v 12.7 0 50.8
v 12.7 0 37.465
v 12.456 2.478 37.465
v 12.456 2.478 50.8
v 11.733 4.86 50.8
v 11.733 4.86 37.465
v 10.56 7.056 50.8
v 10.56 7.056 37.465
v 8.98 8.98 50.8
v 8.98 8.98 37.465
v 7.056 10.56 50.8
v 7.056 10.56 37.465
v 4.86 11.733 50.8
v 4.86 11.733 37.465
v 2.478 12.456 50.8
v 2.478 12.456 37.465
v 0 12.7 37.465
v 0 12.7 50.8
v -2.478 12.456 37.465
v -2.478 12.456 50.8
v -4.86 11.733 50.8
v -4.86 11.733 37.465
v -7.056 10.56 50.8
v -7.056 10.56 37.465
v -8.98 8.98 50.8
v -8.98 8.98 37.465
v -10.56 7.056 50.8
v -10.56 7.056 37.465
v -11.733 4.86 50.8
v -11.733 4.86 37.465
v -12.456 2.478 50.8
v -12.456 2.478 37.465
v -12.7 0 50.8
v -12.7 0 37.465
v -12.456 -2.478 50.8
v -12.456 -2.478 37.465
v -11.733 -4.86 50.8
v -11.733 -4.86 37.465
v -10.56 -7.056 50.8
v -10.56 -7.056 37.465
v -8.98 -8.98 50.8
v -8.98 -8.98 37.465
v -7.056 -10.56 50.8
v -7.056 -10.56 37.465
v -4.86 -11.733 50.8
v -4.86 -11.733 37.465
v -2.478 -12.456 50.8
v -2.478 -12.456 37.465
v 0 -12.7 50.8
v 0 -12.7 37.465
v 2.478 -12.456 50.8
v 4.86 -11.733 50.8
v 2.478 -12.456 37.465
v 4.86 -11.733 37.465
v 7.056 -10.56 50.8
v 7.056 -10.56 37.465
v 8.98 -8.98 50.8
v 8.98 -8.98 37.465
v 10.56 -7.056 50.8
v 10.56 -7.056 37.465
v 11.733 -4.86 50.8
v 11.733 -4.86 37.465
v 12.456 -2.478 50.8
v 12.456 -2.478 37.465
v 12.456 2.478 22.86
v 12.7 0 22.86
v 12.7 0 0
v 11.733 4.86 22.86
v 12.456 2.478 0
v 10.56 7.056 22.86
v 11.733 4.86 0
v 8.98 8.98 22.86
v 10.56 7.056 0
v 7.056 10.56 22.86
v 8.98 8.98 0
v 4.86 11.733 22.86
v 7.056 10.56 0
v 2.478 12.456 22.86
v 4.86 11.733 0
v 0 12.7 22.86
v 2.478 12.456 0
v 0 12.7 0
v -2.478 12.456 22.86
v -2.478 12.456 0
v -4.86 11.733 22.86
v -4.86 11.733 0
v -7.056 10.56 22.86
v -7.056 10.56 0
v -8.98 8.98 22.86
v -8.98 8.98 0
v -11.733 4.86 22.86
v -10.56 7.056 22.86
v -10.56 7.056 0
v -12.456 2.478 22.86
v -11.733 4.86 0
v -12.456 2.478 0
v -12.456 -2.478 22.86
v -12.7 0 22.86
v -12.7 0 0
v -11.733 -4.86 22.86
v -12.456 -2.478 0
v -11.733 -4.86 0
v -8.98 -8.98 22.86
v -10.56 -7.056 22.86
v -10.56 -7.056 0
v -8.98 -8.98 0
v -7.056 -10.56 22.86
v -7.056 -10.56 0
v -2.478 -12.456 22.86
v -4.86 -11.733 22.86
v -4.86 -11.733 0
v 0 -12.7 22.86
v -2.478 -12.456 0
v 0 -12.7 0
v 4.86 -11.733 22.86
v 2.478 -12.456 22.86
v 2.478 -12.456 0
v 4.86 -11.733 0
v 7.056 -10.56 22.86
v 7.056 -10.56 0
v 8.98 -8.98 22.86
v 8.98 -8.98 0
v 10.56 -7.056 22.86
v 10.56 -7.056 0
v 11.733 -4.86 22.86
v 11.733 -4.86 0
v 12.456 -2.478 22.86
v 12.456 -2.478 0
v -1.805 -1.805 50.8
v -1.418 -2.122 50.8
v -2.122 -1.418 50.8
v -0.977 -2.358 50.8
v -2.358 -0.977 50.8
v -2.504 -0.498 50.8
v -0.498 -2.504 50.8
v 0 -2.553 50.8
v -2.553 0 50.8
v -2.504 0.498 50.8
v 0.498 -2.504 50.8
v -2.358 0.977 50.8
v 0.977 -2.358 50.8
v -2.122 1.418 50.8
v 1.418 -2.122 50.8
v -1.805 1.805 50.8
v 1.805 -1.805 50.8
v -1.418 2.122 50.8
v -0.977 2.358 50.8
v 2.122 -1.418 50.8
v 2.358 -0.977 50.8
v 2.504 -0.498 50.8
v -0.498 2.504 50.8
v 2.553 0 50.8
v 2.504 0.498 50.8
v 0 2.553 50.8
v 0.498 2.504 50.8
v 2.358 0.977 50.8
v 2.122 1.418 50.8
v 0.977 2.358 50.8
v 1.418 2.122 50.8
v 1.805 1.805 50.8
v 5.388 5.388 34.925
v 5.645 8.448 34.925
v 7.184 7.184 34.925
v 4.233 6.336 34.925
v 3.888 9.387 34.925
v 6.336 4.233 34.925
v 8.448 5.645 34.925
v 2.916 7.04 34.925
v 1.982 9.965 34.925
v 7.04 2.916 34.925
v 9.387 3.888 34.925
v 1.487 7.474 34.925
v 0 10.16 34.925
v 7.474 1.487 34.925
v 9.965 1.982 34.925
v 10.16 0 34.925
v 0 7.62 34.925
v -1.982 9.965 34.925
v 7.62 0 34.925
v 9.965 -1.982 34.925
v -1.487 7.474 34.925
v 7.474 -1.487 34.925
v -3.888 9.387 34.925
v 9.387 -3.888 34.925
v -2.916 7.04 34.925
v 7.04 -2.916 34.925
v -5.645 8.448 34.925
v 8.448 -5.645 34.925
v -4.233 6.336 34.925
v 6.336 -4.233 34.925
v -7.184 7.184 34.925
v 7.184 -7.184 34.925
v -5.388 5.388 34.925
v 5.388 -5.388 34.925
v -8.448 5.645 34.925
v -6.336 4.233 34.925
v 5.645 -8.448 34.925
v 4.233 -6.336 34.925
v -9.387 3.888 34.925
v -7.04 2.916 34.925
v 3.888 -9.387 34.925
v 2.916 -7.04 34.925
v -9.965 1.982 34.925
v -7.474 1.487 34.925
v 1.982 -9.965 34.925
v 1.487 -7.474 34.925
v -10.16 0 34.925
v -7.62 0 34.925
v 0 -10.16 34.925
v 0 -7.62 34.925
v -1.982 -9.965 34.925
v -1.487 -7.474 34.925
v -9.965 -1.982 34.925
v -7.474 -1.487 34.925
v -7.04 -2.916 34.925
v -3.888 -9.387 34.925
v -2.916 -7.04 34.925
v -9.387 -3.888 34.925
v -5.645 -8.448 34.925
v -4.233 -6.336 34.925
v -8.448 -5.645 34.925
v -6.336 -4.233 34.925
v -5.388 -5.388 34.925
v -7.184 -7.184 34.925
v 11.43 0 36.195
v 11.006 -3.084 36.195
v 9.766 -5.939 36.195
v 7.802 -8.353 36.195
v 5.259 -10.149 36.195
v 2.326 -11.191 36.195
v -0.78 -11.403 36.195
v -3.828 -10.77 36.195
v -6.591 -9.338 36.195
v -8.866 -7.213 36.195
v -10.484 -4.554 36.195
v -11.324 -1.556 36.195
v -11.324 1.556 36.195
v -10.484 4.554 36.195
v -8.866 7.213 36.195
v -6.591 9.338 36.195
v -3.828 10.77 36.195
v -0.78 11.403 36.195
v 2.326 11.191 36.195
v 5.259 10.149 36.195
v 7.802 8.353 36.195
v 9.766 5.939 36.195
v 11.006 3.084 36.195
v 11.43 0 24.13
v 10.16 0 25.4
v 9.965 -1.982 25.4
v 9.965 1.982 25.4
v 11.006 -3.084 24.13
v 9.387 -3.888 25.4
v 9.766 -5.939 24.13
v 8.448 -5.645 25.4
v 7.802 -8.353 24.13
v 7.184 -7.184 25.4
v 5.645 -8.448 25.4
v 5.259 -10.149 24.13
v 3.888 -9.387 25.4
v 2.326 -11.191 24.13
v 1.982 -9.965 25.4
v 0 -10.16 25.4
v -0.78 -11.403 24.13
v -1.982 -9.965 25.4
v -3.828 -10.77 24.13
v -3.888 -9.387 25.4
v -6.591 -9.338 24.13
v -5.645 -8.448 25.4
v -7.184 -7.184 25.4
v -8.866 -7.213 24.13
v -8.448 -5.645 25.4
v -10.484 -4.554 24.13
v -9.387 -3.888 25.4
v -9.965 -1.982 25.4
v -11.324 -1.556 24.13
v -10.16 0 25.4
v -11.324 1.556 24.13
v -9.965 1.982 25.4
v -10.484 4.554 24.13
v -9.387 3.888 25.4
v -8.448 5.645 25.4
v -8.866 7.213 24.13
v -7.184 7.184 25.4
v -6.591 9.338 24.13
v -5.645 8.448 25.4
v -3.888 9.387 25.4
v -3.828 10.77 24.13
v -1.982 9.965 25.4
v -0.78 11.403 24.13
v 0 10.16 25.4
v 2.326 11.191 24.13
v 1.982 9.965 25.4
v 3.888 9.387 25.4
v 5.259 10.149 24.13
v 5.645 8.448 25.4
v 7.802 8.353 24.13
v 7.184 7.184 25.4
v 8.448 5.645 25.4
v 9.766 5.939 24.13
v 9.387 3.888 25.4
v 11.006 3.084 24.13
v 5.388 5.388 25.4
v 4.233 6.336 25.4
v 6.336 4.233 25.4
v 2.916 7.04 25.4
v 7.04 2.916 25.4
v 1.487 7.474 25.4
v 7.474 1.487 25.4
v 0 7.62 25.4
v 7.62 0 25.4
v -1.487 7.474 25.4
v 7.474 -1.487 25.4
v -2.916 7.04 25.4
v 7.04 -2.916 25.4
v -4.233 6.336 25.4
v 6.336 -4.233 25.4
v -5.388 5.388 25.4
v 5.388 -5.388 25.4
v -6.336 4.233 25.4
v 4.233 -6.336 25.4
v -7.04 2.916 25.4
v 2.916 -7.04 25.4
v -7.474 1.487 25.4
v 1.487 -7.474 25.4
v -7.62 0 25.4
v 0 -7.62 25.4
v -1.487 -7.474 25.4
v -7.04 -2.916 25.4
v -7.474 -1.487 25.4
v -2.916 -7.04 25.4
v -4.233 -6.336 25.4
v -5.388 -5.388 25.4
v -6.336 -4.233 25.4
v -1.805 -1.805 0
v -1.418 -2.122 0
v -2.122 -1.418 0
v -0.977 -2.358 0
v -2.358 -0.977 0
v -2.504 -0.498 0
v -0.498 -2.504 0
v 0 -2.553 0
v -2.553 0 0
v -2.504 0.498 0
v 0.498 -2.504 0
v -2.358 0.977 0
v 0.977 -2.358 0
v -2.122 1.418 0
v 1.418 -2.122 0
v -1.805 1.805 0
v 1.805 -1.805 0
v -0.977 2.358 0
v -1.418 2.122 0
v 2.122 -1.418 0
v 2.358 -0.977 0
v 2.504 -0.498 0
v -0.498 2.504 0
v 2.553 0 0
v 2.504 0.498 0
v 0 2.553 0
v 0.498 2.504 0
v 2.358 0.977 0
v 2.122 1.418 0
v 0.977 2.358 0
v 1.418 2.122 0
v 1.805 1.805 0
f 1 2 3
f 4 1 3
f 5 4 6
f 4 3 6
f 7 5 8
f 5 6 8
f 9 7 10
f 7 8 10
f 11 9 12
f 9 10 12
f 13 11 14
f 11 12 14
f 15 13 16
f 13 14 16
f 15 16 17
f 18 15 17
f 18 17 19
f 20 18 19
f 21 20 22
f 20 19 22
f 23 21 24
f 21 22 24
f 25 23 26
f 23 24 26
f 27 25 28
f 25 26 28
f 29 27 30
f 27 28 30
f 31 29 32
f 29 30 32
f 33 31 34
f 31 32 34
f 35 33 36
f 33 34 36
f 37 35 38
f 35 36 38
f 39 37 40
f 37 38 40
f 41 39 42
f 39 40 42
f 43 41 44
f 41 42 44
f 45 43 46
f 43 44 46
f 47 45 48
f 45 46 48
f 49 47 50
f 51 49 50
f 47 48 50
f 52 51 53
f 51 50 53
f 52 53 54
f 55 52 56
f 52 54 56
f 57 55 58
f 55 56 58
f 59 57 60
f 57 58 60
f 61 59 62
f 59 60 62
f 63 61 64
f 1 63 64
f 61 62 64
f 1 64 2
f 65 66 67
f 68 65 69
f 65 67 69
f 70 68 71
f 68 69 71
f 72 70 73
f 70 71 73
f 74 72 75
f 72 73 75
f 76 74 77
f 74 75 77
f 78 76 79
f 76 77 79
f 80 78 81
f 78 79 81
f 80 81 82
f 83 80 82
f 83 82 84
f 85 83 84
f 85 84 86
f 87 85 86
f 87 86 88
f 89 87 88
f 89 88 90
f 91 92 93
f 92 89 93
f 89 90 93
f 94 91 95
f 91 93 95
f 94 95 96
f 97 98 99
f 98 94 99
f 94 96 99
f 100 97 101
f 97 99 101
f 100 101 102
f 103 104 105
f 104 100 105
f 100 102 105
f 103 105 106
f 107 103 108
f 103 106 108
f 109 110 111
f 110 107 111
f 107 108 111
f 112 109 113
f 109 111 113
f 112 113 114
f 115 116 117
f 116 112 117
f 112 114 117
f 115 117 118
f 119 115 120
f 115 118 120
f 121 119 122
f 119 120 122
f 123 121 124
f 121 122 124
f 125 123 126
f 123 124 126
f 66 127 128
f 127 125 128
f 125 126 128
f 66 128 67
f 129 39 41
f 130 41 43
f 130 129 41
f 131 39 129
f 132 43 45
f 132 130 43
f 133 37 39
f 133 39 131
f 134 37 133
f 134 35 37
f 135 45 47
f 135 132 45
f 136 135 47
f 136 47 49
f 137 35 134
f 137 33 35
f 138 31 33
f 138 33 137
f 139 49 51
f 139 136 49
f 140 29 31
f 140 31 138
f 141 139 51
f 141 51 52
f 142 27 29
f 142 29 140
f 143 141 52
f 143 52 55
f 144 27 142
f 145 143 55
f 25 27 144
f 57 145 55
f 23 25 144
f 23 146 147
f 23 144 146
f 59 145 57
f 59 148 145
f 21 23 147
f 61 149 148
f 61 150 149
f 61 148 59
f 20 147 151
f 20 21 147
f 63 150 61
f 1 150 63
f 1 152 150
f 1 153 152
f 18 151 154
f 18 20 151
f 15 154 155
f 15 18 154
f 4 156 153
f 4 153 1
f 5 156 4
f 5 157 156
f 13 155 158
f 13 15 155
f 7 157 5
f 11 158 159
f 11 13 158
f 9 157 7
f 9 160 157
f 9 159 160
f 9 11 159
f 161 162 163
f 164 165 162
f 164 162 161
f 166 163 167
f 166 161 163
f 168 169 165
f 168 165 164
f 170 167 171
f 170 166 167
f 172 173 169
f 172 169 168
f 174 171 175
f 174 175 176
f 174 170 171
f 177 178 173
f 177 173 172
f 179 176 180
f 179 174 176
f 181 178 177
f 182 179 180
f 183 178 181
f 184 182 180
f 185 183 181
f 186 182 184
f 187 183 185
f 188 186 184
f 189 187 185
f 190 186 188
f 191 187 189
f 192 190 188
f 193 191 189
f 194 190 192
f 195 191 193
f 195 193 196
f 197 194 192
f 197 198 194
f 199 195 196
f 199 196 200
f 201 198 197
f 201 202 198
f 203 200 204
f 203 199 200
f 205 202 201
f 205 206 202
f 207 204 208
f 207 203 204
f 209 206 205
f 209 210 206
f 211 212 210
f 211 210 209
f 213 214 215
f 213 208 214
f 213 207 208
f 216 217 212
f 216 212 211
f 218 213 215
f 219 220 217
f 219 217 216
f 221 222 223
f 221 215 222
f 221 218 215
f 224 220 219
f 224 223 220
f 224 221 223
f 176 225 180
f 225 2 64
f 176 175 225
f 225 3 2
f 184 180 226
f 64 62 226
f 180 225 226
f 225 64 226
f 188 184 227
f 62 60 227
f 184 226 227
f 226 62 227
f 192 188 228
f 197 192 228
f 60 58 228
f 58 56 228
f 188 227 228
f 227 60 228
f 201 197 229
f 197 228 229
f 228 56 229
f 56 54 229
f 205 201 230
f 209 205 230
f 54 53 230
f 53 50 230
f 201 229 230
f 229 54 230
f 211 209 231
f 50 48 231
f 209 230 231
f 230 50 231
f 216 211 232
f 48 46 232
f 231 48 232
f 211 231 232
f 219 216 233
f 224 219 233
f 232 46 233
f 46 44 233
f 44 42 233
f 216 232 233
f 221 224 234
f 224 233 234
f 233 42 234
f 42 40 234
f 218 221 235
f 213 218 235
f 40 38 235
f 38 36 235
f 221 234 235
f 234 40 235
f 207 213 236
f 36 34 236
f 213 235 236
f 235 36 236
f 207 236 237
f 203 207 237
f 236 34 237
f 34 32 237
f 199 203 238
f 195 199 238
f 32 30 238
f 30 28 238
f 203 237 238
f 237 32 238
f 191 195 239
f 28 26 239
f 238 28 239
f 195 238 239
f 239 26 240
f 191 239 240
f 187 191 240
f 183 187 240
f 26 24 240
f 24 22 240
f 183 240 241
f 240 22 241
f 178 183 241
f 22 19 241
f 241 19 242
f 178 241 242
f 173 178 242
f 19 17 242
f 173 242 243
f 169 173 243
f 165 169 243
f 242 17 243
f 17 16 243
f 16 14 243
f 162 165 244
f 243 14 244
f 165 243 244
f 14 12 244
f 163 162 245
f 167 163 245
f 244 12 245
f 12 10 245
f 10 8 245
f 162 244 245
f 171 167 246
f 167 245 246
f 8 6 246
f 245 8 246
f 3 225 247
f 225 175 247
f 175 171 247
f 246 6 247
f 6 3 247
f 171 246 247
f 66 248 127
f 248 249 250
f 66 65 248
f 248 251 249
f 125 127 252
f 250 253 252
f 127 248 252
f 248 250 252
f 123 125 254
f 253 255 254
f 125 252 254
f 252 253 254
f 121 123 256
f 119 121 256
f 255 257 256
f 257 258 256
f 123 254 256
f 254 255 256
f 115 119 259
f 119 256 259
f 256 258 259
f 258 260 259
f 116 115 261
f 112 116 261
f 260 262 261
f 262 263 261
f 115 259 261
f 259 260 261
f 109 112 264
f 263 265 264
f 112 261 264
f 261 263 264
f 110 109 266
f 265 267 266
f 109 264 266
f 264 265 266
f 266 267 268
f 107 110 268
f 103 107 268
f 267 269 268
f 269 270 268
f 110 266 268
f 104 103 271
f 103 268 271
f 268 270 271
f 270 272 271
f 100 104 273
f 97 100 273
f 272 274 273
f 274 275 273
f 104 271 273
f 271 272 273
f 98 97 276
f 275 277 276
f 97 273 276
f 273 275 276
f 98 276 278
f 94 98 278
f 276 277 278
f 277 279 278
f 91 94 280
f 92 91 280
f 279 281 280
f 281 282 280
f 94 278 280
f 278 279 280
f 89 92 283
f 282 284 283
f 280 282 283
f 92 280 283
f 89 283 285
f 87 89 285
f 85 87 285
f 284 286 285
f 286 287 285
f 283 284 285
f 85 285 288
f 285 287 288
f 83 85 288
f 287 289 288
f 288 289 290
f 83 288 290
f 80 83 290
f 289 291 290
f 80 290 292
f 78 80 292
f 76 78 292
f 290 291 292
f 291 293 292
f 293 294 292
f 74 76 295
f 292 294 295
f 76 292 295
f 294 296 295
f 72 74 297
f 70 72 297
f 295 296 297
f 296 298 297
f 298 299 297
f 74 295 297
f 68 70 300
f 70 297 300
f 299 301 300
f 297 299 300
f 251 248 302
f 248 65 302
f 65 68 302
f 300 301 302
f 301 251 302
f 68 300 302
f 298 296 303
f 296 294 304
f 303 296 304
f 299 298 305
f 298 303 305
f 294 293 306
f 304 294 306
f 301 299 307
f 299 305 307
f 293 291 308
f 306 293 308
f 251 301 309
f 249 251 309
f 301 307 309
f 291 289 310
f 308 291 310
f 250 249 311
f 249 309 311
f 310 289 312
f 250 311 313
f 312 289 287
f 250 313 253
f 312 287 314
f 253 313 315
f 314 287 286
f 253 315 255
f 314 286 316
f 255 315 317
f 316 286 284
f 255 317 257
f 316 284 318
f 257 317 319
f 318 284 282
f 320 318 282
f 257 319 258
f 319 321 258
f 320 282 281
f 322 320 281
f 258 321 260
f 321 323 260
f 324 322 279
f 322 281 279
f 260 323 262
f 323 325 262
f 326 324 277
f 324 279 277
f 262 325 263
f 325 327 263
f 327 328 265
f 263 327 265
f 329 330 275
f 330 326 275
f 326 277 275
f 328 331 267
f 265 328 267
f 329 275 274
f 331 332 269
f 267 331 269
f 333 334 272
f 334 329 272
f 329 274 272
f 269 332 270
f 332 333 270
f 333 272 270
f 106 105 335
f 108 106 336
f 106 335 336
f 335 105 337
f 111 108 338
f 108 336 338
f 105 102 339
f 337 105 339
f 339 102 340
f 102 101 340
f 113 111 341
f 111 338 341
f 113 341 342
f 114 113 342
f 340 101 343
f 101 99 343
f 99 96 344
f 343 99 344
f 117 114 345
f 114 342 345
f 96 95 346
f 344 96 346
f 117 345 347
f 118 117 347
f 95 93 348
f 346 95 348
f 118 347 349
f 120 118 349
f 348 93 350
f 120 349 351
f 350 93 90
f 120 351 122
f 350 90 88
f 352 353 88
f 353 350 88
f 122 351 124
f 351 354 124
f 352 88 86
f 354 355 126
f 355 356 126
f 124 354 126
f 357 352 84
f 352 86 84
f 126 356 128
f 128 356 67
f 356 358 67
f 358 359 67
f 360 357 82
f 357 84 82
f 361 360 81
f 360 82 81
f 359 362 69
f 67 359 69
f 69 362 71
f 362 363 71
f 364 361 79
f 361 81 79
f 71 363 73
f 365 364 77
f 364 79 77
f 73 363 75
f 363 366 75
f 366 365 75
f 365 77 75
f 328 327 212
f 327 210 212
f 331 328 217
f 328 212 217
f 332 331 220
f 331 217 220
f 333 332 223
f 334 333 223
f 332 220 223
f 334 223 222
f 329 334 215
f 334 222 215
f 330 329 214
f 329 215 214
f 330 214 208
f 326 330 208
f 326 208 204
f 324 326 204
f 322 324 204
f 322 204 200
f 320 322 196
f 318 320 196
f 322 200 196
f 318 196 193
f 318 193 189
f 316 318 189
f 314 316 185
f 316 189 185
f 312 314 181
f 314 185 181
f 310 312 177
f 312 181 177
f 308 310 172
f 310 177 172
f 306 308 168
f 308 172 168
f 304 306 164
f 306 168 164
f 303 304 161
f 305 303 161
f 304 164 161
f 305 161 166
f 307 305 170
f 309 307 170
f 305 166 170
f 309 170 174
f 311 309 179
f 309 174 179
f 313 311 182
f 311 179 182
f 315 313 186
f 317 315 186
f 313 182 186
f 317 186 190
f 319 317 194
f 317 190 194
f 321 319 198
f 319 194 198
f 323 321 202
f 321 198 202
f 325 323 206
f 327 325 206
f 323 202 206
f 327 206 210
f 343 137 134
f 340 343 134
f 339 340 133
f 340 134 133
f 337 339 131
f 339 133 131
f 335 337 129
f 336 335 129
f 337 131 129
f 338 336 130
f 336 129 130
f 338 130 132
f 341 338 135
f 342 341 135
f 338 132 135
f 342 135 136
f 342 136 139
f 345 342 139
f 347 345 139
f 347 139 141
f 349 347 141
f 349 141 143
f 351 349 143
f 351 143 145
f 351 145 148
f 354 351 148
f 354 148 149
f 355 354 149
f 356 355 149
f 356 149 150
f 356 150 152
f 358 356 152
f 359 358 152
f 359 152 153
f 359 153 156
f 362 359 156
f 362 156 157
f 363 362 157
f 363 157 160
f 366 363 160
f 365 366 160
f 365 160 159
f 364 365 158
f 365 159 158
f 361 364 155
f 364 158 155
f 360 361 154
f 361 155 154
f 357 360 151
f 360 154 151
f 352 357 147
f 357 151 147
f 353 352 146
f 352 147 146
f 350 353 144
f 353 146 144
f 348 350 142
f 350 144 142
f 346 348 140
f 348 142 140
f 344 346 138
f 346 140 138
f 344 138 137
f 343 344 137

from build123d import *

# Parameters (mm, degrees)
F0_R     = 12.7
F1_DEPTH = 50.8
F2_W     = 5.08
F2_H     = 9.525
F4_SIZE  = 2.54
F6_D     = 5.1054


with BuildPart() as f1:
    # F0 (on Top) → F1 (new body)
    with BuildSketch(Plane.XY):
        Circle(F0_R)
    extrude(amount=F1_DEPTH)

    # F2 (on Right) → F3 (revolve, cut)
    with BuildSketch(Plane.YZ):
        with Locations((-10.16, 30.1625)):
            Rectangle(F2_W, F2_H)
    revolve(axis=Axis((0, 0, 51.1521063745), (0, 0, -1)), mode=Mode.SUBTRACT)

    # F4
    f4_edges = [f1.edges().sort_by_distance(p)[0] for p in [
        (-12.7, 0, 25.4),
        (-12.7, 0, 34.925),
    ]]
    chamfer(f4_edges, length=F4_SIZE)

    # F6 (through all)
    with Locations(Plane(origin=(0, 0, 0), x_dir=(1, 0, 0), z_dir=(0, 0, -1))):
        with Locations((0, 0)):
            Hole(F6_D / 2)


solid = f1.part
